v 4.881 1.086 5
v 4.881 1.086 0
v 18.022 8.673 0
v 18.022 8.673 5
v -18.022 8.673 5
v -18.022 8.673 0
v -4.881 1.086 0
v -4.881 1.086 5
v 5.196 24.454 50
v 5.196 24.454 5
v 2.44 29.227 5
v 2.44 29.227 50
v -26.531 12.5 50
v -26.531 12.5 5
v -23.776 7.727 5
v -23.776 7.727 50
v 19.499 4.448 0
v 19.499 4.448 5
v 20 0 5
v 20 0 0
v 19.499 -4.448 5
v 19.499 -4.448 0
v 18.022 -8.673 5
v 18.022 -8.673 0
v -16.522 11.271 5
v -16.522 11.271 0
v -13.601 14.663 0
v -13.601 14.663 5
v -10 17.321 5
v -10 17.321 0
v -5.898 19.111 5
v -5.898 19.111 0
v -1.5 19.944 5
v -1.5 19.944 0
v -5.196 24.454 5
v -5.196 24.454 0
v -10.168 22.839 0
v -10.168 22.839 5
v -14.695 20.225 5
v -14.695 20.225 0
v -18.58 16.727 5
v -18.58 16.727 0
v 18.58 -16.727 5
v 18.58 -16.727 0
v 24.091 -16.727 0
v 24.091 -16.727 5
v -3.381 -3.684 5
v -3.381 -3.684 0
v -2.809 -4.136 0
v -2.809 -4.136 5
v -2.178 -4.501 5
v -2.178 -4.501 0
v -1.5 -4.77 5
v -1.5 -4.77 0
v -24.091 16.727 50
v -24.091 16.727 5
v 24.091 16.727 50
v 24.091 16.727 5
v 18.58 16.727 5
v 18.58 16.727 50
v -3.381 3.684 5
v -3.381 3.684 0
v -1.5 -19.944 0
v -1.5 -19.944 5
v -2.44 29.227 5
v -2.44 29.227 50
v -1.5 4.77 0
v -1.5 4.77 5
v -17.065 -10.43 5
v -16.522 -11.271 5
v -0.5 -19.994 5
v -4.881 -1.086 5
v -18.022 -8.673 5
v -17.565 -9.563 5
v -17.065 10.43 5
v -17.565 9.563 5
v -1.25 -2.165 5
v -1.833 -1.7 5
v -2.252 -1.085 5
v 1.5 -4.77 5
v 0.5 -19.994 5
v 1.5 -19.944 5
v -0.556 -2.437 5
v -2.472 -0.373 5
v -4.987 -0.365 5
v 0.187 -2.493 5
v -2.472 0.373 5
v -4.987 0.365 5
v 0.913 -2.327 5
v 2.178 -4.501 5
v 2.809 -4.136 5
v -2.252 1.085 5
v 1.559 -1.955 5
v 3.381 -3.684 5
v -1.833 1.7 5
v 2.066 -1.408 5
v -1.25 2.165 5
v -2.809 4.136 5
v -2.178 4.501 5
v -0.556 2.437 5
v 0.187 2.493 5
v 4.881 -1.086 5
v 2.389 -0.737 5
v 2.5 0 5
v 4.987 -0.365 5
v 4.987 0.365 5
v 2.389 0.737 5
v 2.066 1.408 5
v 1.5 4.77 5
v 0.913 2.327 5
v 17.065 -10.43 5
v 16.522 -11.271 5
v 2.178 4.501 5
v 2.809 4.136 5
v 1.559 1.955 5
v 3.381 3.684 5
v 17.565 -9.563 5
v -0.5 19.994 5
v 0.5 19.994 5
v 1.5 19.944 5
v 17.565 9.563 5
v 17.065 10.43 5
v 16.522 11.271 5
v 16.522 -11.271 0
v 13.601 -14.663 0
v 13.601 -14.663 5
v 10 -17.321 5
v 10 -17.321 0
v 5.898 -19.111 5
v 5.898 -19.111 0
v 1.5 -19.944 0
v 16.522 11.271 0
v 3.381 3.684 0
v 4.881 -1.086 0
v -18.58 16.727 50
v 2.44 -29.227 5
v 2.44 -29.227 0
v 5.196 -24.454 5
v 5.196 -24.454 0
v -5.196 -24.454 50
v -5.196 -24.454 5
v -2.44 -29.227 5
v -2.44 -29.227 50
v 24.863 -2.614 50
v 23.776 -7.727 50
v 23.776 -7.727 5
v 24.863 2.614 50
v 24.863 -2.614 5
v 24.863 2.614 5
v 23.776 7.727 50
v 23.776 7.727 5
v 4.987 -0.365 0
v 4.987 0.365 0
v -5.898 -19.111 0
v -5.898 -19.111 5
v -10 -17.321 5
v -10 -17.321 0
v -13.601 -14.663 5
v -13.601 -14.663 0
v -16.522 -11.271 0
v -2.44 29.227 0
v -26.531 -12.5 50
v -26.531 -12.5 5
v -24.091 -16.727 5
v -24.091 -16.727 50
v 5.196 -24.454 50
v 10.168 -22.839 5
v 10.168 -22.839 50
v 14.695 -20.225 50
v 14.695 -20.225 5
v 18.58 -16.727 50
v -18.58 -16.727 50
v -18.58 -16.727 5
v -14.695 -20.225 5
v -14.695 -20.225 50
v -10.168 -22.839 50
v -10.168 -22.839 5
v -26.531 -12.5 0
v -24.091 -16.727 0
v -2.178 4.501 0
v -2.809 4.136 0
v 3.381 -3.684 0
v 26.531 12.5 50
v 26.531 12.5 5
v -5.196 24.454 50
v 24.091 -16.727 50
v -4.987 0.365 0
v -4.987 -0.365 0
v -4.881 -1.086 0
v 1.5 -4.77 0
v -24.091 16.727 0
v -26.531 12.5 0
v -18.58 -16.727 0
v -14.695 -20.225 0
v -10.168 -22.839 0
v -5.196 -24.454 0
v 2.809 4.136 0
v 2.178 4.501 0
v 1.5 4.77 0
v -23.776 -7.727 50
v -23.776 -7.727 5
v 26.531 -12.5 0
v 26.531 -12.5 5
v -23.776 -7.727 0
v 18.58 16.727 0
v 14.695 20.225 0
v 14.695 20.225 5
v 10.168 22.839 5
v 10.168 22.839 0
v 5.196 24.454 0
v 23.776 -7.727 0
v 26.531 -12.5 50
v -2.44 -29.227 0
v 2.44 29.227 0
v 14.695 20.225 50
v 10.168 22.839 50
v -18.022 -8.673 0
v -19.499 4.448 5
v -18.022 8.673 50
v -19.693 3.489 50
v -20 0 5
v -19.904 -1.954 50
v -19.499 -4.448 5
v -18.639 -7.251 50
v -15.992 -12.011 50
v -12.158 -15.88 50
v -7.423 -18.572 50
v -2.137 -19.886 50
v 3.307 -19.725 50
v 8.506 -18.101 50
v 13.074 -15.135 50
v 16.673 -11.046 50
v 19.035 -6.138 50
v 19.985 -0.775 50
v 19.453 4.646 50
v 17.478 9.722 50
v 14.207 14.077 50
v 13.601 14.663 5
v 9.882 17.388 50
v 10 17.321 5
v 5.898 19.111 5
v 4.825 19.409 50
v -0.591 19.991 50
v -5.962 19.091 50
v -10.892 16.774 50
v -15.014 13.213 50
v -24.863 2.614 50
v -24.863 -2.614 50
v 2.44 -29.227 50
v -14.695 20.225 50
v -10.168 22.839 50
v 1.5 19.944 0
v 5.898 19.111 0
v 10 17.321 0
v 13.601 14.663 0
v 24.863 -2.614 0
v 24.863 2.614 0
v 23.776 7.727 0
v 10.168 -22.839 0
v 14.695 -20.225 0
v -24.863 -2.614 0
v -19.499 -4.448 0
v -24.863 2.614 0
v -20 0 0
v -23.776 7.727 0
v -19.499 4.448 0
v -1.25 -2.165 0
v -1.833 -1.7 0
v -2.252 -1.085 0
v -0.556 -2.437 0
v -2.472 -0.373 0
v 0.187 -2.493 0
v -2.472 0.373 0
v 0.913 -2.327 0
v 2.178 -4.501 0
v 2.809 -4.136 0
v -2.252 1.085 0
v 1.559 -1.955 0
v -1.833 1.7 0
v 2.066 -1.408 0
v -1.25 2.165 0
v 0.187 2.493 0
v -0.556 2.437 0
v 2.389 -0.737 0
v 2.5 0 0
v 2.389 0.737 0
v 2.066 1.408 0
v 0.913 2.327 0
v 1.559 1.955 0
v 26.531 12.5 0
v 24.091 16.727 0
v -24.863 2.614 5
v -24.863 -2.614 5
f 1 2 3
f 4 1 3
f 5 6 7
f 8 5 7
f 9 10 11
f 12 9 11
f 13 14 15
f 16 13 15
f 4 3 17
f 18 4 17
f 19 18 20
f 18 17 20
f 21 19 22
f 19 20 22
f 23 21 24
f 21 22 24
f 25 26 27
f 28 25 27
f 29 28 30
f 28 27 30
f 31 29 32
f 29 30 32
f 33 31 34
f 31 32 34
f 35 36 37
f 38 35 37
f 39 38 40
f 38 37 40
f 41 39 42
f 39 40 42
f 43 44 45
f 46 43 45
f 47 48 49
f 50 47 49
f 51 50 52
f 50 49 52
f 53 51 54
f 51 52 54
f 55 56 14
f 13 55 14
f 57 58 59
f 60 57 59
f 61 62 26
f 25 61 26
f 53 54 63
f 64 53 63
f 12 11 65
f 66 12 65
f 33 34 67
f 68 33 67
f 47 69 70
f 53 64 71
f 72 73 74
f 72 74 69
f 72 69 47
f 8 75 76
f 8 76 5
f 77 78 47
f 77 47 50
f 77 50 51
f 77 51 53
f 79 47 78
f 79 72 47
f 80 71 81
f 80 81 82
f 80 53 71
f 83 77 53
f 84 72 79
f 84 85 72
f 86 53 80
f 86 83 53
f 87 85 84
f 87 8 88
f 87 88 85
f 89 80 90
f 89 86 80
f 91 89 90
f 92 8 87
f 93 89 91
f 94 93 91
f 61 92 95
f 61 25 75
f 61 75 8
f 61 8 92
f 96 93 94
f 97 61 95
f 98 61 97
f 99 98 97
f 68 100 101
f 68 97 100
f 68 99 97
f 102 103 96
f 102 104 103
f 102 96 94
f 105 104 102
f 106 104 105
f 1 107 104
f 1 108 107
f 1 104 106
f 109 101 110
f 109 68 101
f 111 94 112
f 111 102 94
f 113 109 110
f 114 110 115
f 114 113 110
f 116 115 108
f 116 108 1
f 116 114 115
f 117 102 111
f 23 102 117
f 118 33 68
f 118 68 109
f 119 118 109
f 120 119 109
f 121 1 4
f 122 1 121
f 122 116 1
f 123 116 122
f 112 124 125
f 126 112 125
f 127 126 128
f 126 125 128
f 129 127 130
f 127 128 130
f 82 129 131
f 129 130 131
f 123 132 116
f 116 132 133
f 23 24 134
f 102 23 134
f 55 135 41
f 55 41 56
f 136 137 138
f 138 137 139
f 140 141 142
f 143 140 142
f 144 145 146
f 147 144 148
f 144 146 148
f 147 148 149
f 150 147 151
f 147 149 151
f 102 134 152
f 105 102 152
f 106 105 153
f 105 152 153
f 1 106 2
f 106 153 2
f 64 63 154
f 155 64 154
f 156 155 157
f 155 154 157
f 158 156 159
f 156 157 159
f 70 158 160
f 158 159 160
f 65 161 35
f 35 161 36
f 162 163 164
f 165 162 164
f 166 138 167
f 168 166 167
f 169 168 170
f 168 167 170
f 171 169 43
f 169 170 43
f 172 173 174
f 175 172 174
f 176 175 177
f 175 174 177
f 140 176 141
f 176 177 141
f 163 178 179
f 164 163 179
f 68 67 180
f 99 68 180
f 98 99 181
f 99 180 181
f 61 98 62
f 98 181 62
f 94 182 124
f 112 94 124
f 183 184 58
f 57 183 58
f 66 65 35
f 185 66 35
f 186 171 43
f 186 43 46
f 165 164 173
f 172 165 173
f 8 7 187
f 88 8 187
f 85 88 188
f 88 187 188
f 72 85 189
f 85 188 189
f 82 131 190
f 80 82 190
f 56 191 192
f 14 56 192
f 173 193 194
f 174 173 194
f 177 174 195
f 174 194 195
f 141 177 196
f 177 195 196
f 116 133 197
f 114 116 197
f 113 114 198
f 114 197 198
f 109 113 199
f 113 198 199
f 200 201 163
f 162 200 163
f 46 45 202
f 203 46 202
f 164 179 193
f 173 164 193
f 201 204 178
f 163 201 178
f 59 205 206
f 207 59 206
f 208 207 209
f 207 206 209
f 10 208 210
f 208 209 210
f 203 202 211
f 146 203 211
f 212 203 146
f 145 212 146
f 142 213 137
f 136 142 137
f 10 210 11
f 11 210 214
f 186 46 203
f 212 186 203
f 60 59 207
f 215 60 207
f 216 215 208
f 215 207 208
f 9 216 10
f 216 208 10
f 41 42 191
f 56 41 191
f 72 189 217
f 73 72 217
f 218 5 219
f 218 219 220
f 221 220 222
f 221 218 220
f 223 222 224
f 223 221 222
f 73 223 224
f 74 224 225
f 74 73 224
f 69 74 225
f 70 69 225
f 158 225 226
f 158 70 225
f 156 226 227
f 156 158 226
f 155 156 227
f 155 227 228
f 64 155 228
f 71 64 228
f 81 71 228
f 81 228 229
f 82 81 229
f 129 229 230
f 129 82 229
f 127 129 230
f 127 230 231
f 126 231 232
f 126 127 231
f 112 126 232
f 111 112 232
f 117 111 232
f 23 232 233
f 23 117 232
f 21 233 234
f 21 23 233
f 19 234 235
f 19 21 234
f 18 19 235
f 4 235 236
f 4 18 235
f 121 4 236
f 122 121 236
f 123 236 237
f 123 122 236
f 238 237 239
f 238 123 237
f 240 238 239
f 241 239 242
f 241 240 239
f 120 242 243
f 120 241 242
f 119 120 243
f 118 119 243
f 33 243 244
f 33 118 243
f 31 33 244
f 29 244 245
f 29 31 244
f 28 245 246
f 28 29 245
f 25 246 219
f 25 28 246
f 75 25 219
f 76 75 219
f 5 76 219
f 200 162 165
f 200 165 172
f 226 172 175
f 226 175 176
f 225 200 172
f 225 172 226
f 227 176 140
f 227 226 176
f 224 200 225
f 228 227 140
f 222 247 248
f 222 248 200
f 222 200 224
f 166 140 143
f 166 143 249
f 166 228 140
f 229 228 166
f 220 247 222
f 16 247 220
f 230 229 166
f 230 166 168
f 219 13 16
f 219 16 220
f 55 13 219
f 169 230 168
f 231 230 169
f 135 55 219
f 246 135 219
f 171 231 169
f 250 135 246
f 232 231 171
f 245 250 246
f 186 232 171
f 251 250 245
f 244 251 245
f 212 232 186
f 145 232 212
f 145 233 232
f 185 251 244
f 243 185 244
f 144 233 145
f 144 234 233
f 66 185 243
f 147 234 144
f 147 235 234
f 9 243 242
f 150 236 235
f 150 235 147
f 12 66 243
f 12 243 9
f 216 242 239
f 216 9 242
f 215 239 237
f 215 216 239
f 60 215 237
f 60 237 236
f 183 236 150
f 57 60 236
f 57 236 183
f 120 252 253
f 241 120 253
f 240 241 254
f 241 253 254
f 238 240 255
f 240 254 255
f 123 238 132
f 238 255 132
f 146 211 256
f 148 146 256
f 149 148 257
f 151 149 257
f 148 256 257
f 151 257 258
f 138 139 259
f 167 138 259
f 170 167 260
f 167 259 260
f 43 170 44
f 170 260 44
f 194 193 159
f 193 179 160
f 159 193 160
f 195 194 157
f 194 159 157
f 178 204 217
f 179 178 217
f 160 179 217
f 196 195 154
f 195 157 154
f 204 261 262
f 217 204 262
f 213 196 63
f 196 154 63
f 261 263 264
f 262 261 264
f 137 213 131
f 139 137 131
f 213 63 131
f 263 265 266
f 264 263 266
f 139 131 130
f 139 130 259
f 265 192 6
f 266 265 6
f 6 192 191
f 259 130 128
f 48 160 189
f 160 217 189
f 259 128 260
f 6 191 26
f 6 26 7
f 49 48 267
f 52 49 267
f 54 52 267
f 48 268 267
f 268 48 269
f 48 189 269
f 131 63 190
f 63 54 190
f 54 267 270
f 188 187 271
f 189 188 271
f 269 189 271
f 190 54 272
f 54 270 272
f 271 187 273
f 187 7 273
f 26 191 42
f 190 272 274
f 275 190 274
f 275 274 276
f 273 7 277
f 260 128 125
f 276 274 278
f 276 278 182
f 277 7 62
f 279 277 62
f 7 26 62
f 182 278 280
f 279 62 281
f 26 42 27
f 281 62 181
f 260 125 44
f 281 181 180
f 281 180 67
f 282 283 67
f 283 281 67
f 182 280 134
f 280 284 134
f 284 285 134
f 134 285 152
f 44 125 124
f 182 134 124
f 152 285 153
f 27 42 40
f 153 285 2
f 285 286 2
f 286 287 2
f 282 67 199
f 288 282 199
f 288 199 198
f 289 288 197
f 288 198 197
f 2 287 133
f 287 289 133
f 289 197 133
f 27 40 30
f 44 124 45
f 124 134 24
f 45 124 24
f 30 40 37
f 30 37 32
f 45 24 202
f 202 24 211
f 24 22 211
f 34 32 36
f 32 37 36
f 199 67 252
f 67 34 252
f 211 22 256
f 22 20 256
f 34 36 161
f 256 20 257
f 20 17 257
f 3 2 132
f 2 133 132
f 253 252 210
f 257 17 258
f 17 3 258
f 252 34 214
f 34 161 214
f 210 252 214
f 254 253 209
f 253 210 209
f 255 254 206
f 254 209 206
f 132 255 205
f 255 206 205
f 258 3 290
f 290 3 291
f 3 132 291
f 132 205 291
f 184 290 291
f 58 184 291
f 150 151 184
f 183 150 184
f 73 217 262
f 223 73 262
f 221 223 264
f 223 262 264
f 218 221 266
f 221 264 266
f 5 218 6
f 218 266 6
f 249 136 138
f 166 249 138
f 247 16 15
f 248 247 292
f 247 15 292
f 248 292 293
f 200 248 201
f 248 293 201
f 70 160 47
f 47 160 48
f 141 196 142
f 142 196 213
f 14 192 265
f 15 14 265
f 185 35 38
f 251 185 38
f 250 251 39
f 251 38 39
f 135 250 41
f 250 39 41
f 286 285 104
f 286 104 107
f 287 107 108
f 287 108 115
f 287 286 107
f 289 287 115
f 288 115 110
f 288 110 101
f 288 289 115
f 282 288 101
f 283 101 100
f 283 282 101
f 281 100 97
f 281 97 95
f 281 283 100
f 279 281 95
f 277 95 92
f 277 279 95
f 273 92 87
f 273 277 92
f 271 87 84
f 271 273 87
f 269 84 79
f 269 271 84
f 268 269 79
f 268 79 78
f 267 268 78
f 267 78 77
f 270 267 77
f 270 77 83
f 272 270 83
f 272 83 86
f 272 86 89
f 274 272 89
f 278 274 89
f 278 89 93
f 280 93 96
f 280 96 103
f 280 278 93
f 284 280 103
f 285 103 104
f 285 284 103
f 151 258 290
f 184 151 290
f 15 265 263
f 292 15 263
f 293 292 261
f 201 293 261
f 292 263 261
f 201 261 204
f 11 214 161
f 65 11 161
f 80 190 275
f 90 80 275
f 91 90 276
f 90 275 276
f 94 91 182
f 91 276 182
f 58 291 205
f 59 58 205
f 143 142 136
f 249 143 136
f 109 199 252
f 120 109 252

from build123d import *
from build123d.topology import SkipClean

# Parameters (mm, degrees)
SKETCH2_R           = 2.5
BOSS_EXTRUDE2_DEPTH = 5
SKETCH3_R           = 20
BOSS_EXTRUDE3_DEPTH = 45


with BuildPart() as part:
    # Sketch2 → Boss-Extrude2 (new body)
    with BuildSketch(Plane.XY):
        with BuildLine():
            ThreePointArc((-5.195852071, 24.45410234), (-12.5, 21.650635095), (-18.579947817, 16.726791058))
            Line((-18.579947817, 16.726791058), (-24.09097405, 16.726791058))
            Line((-24.09097405, 16.726791058), (-26.531313005, 12.5))
            Line((-26.531313005, 12.5), (-23.775799889, 7.727311282))
            ThreePointArc((-23.775799889, 7.727311282), (-25, 0), (-23.775799889, -7.727311282))
            Line((-23.775799889, -7.727311282), (-26.531313005, -12.5))
            Line((-26.531313005, -12.5), (-24.09097405, -16.726791058))
            Line((-24.09097405, -16.726791058), (-18.579947817, -16.726791058))
            ThreePointArc((-18.579947817, -16.726791058), (-12.5, -21.650635095), (-5.195852071, -24.45410234))
            Line((-5.195852071, -24.45410234), (-2.440338955, -29.226791058))
            Line((-2.440338955, -29.226791058), (2.440338955, -29.226791058))
            Line((2.440338955, -29.226791058), (5.195852071, -24.45410234))
            ThreePointArc((5.195852071, -24.45410234), (12.5, -21.650635095), (18.579947817, -16.726791058))
            Line((18.579947817, -16.726791058), (24.09097405, -16.726791058))
            Line((24.09097405, -16.726791058), (26.531313005, -12.5))
            Line((26.531313005, -12.5), (23.775799889, -7.727311282))
            ThreePointArc((23.775799889, -7.727311282), (25, 0), (23.775799889, 7.727311282))
            Line((23.775799889, 7.727311282), (26.531313005, 12.5))
            Line((26.531313005, 12.5), (24.09097405, 16.726791058))
            Line((24.09097405, 16.726791058), (18.579947817, 16.726791058))
            ThreePointArc((18.579947817, 16.726791058), (12.5, 21.650635095), (5.195852071, 24.45410234))
            Line((5.195852071, 24.45410234), (2.440338955, 29.226791058))
            Line((2.440338955, 29.226791058), (-2.440338955, 29.226791058))
            Line((-2.440338955, 29.226791058), (-5.195852071, 24.45410234))
        make_face()
        with BuildLine():
            Line((-16.521725449, -11.270873443), (-3.38067791, -3.683886109))
            ThreePointArc((-3.38067791, -3.683886109), (-2.5, -4.330127019), (-1.5, -4.769696007))
            Line((-1.5, -4.769696007), (-1.5, -19.943670675))
            ThreePointArc((-1.5, -19.943670675), (-10, -17.320508076), (-16.521725449, -11.270873443))
        make_face(mode=Mode.SUBTRACT)
        with BuildLine():
            Line((-18.021725449, 8.672797232), (-4.88067791, 1.085809898))
            ThreePointArc((-4.88067791, 1.085809898), (-5, 0), (-4.88067791, -1.085809898))
            Line((-4.88067791, -1.085809898), (-18.021725449, -8.672797232))
            ThreePointArc((-18.021725449, -8.672797232), (-20, 0), (-18.021725449, 8.672797232))
        make_face(mode=Mode.SUBTRACT)
        with BuildLine():
            Line((1.5, -19.943670675), (1.5, -4.769696007))
            ThreePointArc((1.5, -4.769696007), (2.5, -4.330127019), (3.38067791, -3.683886109))
            Line((3.38067791, -3.683886109), (16.521725449, -11.270873443))
            ThreePointArc((16.521725449, -11.270873443), (10, -17.320508076), (1.5, -19.943670675))
        make_face(mode=Mode.SUBTRACT)
        with BuildLine():
            Line((-1.5, 19.943670675), (-1.5, 4.769696007))
            ThreePointArc((-1.5, 4.769696007), (-2.5, 4.330127019), (-3.38067791, 3.683886109))
            Line((-3.38067791, 3.683886109), (-16.521725449, 11.270873443))
            ThreePointArc((-16.521725449, 11.270873443), (-10, 17.320508076), (-1.5, 19.943670675))
        make_face(mode=Mode.SUBTRACT)
        Circle(SKETCH2_R, mode=Mode.SUBTRACT)
        with BuildLine():
            Line((18.021725449, -8.672797232), (4.88067791, -1.085809898))
            ThreePointArc((4.88067791, -1.085809898), (5, 0), (4.88067791, 1.085809898))
            Line((4.88067791, 1.085809898), (18.021725449, 8.672797232))
            ThreePointArc((18.021725449, 8.672797232), (20, 0), (18.021725449, -8.672797232))
        make_face(mode=Mode.SUBTRACT)
        with BuildLine():
            Line((16.521725449, 11.270873443), (3.38067791, 3.683886109))
            ThreePointArc((3.38067791, 3.683886109), (2.5, 4.330127019), (1.5, 4.769696007))
            Line((1.5, 4.769696007), (1.5, 19.943670675))
            ThreePointArc((1.5, 19.943670675), (10, 17.320508076), (16.521725449, 11.270873443))
        make_face(mode=Mode.SUBTRACT)
    extrude(amount=BOSS_EXTRUDE2_DEPTH)

    # Sketch3 → Boss-Extrude3 (add)
    with SkipClean():  # the faces are left unmerged after this step: merging them gives an invalid solid
        with BuildSketch(Plane.XY.offset(5)):
            with BuildLine():
                Line((-2.440338955, 29.226791058), (-5.195852071, 24.45410234))
                ThreePointArc((-5.195852071, 24.45410234), (-12.5, 21.650635095), (-18.579947817, 16.726791058))
                Line((-18.579947817, 16.726791058), (-24.09097405, 16.726791058))
                Line((-24.09097405, 16.726791058), (-26.531313005, 12.5))
                Line((-26.531313005, 12.5), (-23.775799889, 7.727311282))
                ThreePointArc((-23.775799889, 7.727311282), (-25, 0), (-23.775799889, -7.727311282))
                Line((-23.775799889, -7.727311282), (-26.531313005, -12.5))
                Line((-26.531313005, -12.5), (-24.09097405, -16.726791058))
                Line((-24.09097405, -16.726791058), (-18.579947817, -16.726791058))
                ThreePointArc((-18.579947817, -16.726791058), (-12.5, -21.650635095), (-5.195852071, -24.45410234))
                Line((-5.195852071, -24.45410234), (-2.440338955, -29.226791058))
                Line((-2.440338955, -29.226791058), (2.440338955, -29.226791058))
                Line((2.440338955, -29.226791058), (5.195852071, -24.45410234))
                ThreePointArc((5.195852071, -24.45410234), (12.5, -21.650635095), (18.579947817, -16.726791058))
                Line((18.579947817, -16.726791058), (24.09097405, -16.726791058))
                Line((24.09097405, -16.726791058), (26.531313005, -12.5))
                Line((26.531313005, -12.5), (23.775799889, -7.727311282))
                ThreePointArc((23.775799889, -7.727311282), (25, 0), (23.775799889, 7.727311282))
                Line((23.775799889, 7.727311282), (26.531313005, 12.5))
                Line((26.531313005, 12.5), (24.09097405, 16.726791058))
                Line((24.09097405, 16.726791058), (18.579947817, 16.726791058))
                ThreePointArc((18.579947817, 16.726791058), (12.5, 21.650635095), (5.195852071, 24.45410234))
                Line((5.195852071, 24.45410234), (2.440338955, 29.226791058))
                Line((2.440338955, 29.226791058), (-2.440338955, 29.226791058))
            make_face()
            with Locations(Location((0, 0, 0), (0, 0, 154.301222305))):
                Circle(SKETCH3_R, mode=Mode.SUBTRACT)
        extrude(amount=BOSS_EXTRUDE3_DEPTH)


solid = part.part
